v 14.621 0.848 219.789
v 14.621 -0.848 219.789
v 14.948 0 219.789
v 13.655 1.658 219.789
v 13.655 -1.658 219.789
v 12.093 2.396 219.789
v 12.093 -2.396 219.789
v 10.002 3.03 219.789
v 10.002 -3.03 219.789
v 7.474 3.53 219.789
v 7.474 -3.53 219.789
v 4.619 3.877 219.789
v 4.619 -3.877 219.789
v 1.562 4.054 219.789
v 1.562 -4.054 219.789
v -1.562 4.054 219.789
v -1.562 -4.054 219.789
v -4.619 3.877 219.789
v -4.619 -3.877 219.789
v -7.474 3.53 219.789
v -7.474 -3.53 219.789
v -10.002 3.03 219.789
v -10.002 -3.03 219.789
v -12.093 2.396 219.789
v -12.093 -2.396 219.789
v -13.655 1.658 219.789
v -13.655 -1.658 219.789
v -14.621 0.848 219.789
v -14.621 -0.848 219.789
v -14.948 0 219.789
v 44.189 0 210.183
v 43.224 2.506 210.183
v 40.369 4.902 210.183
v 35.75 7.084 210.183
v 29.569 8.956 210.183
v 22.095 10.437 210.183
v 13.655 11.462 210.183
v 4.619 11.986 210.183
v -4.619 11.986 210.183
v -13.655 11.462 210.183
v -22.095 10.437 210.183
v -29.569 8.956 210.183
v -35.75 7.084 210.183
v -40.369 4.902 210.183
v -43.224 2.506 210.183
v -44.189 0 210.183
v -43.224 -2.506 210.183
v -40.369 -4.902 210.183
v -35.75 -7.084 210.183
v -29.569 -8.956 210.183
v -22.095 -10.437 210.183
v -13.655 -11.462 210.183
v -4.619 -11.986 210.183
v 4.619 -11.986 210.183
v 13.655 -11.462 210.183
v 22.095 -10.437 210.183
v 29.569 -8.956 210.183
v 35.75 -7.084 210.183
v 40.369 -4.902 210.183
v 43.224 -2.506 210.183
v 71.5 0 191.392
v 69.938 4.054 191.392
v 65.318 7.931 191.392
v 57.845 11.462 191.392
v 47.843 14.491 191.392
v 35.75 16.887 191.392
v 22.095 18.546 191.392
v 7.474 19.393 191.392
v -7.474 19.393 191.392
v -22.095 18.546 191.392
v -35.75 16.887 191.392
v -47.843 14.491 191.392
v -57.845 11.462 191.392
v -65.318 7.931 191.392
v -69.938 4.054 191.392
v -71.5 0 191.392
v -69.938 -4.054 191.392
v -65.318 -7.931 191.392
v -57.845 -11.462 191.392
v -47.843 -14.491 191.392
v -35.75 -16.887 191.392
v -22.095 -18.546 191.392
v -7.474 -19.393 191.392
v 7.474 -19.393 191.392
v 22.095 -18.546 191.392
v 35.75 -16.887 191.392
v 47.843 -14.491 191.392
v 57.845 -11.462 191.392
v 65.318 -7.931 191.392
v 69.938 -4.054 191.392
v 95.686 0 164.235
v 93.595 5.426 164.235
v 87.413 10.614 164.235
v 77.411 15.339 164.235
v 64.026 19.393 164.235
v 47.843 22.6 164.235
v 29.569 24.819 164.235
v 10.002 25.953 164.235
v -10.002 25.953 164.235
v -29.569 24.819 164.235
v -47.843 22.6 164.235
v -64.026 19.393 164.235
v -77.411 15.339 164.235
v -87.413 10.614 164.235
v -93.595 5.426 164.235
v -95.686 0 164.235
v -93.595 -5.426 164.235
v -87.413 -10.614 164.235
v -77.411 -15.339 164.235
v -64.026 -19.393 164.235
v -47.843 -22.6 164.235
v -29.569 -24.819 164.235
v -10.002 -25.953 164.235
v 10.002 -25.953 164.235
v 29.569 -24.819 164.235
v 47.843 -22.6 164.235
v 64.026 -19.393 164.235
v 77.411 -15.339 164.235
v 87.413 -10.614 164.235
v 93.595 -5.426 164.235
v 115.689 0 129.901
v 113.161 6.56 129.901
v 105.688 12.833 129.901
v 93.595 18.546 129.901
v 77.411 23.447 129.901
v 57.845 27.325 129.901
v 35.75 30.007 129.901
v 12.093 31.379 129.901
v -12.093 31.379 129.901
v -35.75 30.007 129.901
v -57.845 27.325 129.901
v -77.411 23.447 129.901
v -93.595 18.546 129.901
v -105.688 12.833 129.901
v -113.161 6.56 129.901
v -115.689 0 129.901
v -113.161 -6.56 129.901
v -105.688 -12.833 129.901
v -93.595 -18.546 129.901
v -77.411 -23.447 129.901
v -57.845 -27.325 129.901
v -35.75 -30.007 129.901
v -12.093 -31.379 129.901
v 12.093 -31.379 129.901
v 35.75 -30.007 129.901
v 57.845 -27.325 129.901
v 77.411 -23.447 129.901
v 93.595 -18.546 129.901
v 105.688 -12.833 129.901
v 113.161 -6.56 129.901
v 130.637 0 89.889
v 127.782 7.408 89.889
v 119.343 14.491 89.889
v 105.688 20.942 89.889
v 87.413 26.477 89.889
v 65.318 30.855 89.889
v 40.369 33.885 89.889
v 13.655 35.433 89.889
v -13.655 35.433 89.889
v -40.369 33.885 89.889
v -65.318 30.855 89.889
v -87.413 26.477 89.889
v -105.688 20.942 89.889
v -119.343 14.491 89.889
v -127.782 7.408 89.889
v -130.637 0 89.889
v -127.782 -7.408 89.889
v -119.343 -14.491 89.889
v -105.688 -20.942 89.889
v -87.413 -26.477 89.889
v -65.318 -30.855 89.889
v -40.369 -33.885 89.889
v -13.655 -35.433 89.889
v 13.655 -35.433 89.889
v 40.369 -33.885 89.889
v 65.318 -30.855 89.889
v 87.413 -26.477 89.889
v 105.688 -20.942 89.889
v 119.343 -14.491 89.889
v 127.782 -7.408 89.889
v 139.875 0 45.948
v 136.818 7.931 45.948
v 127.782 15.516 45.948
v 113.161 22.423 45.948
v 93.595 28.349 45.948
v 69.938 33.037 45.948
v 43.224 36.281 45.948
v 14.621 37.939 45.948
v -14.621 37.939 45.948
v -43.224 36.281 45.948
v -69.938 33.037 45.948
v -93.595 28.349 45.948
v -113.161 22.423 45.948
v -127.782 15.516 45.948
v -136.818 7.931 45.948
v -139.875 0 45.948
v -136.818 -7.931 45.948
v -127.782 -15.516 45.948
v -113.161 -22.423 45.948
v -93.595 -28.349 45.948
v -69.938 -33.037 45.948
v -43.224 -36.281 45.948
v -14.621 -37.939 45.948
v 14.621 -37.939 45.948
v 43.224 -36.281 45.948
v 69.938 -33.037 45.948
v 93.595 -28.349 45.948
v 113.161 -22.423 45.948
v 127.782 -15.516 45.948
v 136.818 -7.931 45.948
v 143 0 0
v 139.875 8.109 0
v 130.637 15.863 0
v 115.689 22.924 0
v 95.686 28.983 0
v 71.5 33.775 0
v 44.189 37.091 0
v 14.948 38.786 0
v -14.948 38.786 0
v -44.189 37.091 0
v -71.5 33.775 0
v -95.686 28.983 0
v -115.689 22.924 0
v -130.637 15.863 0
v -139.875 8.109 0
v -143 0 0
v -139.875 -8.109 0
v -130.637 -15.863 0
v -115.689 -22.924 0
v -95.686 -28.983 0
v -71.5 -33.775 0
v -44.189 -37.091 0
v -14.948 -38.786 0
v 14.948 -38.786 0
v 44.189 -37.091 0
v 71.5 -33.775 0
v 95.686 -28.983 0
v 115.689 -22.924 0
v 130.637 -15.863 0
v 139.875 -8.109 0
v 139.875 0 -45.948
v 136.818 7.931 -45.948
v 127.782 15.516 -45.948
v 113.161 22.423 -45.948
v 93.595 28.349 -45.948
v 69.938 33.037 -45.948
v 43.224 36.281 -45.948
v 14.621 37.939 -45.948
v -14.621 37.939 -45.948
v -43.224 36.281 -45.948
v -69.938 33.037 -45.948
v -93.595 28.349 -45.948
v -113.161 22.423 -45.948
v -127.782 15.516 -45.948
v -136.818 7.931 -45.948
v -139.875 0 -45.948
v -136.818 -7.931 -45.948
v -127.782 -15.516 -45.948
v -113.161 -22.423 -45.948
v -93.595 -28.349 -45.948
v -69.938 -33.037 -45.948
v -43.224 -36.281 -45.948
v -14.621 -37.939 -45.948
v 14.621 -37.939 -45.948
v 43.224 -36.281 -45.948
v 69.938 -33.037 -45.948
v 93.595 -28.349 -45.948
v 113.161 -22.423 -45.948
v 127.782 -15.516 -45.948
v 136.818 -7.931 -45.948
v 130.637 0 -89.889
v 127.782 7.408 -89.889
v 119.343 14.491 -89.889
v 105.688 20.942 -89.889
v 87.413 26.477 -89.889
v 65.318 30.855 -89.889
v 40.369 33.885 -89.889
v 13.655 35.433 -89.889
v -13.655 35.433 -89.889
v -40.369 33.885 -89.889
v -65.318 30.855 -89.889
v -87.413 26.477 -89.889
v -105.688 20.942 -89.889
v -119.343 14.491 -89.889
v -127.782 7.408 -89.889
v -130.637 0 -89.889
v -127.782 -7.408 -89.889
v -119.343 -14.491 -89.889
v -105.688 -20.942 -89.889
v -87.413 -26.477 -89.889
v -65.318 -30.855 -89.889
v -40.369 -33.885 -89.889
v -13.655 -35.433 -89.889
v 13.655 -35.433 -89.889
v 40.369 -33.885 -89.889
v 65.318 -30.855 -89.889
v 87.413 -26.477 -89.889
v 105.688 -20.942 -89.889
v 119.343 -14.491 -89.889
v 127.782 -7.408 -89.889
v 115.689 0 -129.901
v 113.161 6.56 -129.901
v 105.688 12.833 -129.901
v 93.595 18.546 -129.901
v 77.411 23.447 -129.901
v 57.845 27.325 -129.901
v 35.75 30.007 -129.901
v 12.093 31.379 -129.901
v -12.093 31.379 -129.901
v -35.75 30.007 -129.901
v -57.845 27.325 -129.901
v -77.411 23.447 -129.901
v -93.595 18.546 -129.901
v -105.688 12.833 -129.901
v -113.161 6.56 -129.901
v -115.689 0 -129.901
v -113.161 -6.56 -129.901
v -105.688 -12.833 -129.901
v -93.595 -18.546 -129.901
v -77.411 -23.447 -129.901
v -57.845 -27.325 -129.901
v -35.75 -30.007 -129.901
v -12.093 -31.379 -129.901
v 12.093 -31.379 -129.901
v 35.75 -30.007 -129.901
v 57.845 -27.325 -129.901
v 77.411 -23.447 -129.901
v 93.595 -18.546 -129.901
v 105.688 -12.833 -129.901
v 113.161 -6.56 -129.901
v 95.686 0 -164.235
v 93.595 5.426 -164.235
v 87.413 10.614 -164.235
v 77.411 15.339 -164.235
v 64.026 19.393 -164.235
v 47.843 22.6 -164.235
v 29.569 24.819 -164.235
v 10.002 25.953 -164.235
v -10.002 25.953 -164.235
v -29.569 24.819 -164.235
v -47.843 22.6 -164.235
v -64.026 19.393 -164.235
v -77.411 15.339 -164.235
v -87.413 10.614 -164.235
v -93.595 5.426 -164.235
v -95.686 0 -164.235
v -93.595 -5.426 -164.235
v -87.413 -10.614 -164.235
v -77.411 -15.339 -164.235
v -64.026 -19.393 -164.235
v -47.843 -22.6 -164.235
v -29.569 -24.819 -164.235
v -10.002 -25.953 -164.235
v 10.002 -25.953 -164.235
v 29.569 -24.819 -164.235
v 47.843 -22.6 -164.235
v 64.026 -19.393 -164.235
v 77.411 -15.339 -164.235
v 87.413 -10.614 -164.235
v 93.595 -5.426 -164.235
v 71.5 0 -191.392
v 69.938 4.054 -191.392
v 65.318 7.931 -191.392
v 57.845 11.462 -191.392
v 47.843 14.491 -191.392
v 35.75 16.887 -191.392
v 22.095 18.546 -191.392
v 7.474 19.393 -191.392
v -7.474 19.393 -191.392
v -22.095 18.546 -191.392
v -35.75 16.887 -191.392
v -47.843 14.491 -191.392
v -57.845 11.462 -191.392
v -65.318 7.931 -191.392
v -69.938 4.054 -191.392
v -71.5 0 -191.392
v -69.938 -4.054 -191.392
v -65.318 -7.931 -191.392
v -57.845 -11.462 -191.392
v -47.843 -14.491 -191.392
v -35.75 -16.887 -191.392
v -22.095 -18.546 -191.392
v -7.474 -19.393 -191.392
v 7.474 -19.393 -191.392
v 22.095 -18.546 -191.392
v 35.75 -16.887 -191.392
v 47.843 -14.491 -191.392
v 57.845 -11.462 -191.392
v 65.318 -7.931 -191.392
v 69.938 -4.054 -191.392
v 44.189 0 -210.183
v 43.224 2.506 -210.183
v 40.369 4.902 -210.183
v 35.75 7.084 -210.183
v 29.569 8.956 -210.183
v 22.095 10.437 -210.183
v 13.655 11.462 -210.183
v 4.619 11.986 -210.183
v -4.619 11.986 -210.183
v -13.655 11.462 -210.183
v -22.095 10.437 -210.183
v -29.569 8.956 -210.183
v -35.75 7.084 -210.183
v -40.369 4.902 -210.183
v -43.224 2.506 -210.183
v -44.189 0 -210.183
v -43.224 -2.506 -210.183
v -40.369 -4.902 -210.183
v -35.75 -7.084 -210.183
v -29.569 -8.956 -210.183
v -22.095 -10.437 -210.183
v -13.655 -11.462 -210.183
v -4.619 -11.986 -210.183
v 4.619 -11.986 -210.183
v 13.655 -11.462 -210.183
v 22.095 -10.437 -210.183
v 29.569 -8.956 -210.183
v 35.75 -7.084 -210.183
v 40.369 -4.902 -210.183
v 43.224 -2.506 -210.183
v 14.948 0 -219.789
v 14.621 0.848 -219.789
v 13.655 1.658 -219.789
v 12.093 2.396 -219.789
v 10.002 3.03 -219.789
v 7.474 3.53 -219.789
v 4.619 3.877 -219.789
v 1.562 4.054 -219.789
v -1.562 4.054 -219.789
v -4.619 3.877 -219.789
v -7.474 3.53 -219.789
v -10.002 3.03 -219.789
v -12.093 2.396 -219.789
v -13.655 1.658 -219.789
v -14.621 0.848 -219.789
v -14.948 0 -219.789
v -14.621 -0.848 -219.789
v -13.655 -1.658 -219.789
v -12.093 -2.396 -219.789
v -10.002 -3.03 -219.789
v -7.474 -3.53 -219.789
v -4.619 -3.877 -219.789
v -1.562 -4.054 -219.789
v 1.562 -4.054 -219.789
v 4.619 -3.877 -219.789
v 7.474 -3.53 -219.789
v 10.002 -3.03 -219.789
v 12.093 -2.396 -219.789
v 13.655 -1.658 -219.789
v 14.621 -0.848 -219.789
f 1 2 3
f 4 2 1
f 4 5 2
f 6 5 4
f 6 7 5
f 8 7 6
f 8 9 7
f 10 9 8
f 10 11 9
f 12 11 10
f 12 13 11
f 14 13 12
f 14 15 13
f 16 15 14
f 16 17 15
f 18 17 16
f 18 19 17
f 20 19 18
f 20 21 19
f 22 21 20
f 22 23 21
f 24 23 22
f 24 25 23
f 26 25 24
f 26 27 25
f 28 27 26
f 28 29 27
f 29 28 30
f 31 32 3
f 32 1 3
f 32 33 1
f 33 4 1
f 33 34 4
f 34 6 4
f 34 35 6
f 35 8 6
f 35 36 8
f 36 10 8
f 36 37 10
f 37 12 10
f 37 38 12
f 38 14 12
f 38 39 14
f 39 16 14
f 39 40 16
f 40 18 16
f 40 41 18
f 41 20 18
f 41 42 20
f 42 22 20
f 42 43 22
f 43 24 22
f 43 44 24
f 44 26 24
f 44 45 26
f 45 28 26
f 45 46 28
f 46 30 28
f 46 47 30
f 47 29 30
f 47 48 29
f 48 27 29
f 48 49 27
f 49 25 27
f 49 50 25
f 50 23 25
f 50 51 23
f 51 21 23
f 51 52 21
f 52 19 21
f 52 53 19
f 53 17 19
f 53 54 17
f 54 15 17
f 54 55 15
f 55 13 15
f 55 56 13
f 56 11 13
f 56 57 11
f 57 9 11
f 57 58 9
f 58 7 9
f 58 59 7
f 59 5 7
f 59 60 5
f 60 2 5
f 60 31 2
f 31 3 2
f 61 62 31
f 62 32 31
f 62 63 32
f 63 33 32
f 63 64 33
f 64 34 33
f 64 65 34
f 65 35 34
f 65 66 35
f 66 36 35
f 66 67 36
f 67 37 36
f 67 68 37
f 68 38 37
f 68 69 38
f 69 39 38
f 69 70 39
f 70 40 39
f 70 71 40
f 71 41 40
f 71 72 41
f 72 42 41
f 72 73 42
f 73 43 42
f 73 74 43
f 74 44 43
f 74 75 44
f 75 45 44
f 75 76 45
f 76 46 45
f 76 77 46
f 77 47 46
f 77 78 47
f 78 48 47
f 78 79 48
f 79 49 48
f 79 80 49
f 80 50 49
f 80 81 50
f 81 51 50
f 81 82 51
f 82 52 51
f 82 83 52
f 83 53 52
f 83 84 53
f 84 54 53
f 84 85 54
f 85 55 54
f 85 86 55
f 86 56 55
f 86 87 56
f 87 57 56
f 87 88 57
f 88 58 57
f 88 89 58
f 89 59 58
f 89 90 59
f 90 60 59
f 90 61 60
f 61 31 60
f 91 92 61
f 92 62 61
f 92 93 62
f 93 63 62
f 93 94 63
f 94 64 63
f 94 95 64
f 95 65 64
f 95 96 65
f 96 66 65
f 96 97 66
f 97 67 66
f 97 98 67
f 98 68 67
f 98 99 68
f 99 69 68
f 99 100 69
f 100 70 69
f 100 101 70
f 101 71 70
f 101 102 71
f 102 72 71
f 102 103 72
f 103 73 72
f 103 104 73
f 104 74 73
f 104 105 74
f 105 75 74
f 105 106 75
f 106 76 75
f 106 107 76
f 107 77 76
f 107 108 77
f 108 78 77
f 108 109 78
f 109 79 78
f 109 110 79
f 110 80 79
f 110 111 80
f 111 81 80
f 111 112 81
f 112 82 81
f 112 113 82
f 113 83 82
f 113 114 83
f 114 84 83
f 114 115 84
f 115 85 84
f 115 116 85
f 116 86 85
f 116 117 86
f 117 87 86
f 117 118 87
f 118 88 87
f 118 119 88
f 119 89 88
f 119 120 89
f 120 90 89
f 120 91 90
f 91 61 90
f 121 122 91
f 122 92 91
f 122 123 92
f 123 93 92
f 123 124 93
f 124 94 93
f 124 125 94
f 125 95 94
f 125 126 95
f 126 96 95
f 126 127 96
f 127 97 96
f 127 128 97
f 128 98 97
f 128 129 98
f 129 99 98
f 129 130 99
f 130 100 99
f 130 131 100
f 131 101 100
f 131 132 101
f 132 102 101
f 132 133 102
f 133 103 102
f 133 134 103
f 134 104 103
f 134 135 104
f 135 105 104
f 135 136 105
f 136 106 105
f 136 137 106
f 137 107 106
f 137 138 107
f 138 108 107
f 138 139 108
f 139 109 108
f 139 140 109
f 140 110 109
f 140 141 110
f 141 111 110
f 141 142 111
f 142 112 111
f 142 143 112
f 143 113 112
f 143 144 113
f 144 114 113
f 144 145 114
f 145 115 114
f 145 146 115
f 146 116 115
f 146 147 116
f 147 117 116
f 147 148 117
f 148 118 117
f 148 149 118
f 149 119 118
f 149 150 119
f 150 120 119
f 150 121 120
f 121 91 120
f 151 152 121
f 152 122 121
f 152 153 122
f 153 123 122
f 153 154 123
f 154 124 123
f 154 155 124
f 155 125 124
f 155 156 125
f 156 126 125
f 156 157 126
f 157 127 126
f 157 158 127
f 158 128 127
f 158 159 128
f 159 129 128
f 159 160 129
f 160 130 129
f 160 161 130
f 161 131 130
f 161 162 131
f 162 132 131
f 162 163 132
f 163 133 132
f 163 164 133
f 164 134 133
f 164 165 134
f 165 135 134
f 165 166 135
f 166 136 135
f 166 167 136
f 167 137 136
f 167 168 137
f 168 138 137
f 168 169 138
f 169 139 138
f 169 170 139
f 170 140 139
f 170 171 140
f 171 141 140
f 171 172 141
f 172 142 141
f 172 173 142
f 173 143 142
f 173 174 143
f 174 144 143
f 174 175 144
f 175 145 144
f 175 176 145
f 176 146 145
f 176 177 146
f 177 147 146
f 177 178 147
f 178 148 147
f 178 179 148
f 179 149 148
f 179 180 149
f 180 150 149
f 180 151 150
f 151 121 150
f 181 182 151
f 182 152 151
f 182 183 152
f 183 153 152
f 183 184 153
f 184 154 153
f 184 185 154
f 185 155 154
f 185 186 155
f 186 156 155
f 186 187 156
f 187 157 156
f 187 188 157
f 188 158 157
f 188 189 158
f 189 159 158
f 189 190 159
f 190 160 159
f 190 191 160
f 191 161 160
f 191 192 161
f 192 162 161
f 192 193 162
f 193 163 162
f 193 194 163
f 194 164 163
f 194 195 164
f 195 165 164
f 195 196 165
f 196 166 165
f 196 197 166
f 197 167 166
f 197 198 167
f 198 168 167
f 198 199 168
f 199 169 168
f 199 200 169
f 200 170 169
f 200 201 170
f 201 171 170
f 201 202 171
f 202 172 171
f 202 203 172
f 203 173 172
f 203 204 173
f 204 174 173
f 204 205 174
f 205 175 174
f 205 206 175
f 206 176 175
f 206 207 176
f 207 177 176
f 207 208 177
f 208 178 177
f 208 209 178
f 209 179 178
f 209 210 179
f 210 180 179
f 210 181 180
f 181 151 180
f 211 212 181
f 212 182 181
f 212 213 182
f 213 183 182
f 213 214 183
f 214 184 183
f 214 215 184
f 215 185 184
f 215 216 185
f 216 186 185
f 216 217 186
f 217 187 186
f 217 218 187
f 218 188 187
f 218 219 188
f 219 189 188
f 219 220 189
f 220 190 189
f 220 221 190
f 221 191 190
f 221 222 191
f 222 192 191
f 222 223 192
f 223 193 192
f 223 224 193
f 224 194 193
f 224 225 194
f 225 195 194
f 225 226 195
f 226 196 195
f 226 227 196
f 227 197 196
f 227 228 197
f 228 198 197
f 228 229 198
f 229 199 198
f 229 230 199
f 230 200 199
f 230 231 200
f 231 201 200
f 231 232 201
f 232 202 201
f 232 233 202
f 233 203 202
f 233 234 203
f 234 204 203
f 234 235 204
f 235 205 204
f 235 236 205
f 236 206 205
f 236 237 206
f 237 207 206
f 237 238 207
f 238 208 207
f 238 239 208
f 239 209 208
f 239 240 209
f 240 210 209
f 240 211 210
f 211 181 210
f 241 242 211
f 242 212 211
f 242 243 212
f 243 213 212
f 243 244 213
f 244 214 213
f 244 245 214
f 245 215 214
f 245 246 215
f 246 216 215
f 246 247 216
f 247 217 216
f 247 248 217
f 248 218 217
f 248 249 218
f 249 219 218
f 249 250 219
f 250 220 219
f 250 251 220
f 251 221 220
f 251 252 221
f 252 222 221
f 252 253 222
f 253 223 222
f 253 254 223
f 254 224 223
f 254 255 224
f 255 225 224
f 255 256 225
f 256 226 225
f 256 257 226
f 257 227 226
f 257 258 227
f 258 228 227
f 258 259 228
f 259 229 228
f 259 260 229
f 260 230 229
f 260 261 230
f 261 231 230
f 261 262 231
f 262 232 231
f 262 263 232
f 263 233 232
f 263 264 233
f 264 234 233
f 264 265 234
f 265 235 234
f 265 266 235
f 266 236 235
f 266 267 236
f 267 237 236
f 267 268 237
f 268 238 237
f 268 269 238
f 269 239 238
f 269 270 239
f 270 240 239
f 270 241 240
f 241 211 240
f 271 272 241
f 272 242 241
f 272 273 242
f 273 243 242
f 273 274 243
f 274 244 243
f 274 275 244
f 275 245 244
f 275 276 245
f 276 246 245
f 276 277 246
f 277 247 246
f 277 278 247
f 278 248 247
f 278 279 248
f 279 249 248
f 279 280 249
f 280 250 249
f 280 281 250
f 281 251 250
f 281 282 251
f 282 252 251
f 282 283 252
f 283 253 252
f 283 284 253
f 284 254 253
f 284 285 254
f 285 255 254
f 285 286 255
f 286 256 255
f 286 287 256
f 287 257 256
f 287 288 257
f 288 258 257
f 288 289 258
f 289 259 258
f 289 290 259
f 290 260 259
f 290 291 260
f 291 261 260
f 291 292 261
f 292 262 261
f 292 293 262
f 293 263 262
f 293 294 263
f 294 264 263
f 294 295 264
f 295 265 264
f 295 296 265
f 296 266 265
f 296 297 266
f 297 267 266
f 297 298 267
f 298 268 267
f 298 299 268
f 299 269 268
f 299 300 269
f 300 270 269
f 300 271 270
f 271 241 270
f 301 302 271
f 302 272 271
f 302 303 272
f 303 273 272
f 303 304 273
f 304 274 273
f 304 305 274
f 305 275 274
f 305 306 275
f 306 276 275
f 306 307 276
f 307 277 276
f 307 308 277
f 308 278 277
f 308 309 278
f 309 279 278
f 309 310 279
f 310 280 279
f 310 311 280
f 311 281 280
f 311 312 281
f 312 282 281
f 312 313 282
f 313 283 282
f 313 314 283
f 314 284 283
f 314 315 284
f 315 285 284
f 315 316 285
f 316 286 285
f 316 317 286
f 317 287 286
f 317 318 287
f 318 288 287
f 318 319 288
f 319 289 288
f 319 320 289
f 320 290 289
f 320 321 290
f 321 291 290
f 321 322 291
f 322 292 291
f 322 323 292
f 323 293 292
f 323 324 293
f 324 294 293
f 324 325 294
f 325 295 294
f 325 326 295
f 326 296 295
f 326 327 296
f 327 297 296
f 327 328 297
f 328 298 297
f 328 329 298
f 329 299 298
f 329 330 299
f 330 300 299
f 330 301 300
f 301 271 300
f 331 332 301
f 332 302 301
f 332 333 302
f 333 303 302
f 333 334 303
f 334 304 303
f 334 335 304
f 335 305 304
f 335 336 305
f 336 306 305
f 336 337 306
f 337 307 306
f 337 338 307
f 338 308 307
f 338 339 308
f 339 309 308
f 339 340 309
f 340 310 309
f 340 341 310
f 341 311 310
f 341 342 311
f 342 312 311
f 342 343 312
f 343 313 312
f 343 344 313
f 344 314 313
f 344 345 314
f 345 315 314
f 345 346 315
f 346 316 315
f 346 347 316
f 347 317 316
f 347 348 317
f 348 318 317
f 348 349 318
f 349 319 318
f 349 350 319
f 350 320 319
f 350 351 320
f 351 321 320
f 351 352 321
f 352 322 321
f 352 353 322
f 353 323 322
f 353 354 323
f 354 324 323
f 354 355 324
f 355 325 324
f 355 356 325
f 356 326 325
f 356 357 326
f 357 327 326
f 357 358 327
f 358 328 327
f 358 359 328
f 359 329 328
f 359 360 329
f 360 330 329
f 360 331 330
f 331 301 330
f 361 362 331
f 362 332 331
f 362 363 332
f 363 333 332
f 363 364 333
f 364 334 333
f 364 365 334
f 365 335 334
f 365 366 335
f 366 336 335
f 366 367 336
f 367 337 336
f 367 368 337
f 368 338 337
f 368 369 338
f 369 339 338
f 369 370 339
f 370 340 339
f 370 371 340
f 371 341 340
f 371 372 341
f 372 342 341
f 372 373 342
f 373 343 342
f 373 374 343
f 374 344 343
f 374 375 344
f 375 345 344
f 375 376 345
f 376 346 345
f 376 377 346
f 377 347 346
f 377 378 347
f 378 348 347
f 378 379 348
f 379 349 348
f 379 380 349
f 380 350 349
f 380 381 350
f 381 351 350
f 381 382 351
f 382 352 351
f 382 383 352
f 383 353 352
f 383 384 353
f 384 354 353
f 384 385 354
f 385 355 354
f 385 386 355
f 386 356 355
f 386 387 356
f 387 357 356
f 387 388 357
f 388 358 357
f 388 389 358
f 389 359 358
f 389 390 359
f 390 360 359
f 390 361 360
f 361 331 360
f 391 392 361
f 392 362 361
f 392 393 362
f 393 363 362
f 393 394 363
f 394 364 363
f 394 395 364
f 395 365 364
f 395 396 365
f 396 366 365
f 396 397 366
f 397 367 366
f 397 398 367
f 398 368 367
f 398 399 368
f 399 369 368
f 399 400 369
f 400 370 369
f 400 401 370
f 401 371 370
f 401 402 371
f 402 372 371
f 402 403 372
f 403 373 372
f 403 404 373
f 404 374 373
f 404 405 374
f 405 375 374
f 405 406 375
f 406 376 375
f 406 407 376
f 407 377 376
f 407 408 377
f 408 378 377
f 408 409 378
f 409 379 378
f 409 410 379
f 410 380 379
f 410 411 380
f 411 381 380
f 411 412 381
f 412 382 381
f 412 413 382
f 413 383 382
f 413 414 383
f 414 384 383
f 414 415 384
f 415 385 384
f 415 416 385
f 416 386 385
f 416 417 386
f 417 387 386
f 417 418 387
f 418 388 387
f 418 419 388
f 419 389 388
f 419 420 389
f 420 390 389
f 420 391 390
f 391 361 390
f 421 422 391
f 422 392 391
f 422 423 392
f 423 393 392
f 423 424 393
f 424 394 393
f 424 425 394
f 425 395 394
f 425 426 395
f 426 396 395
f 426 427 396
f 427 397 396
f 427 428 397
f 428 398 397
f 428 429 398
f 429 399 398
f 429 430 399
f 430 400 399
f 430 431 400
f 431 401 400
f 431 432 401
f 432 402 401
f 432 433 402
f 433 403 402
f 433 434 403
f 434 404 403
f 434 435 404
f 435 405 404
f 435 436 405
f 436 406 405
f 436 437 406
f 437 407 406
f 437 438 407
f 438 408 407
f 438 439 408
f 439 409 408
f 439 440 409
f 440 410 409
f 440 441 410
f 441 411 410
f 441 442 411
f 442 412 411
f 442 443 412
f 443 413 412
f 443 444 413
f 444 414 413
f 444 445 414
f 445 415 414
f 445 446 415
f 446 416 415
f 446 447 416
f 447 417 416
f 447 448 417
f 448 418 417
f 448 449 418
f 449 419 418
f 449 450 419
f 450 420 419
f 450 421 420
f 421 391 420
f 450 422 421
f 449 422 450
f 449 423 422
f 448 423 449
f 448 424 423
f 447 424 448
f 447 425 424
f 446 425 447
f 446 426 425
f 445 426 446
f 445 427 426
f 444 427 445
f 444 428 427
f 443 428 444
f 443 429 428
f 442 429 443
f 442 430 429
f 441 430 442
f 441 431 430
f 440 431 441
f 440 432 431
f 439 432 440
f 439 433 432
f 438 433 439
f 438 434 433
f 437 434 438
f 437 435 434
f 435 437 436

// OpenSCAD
// Generated by SolidPython 1.0.1 on 2020-07-29 00:46:49


scale(v = [11, 3, 17]) {
	sphere(r = 13);
}
/***********************************************
*********      SolidPython code:      **********
************************************************
 
# import packages: SolidPython
from solid import *
from solid.utils import *
from itertools import chain, combinations, permutations


class Resize:

    def __init__(self, scad_file):
        self.scad_file = scad_file
        #self.scad_file = import_scad(scad_file)
        # cone/cylinder param:
        self.r1 = 0
        self.r2 = 0
        self.h = 0
        # rectangular prism param:
        self.w = 0
        self.l = 0
        # ellipse param:
        self.r = 0

    # import OpenScad code (file name corresponds to shape)


    # classify shape + parameters
    def assign(self, param1, param2, param3):
        if self.scad_file == 'cone.scad':
            self.r1 = param1
            self.r2 = param2
            self.h = param3
        elif self.scad_file == 'cylinder.scad':
            self.r1 = param1
            self.r2 = param2
            self.h = param3
        elif self.scad_file == 'rectangularPrism.scad':
            self.h = param1
            self.l = param2
            self.w = param3
        else:
            self.r = param1
            self.h = param2

    # resize parameters
    def iterate(self):
        x = range(3, 20, 2)
        i = 1
        if self.scad_file == 'cone.scad':
            tempList = list(permutations(x, 2))
            for temp in tempList:
                param1 = temp[0]
                param2 = temp[1]
                filepath = 'produced_scad_files/' + 'cone' + str(param1) + '_' + str(param2) + '_' + '.scad'
                scad_render_to_file(cylinder(h=param1, r1=param2, r2=0), filepath)

        elif self.scad_file == 'cylinder.scad':
            tempList = list(permutations(x, 3))
            for temp in tempList:
                param1 = temp[0]
                param2 = temp[1]
                filepath = 'produced_scad_files/' + 'cylinder' + str(param1) + '_' + str(param2) + '_' + '.scad'
                scad_render_to_file(cylinder(h=param1, r1=param2, r2=param2), filepath)

        elif self.scad_file == 'rectangularPrism.scad':
            tempList = list(permutations(x, 3))
            for temp in tempList:
                param1 = temp[0]
                param2 = temp[1]
                param3 = temp[2]
                filepath = 'produced_scad_files/' + 'rectangularPrism' + str(param1) + '_' + str(param2) + '_' + str(
                    param3) + '.scad'
                scad_render_to_file(cube(size=(param1, param2, param3)), filepath)

        elif self.scad_file == 'ellipse.scad':
            tempList = list(permutations(x, 4))
            for temp in tempList:
                param1 = temp[0]
                param2 = temp[1]
                param3 = temp[2]
                param4 = temp[3]
                filepath = 'produced_scad_files/' + 'ellipse' + str(param1) + '_' + str(param2) + '_' + str(param3) + '_' + str(param4) + '.scad'
                scad_render_to_file(scale([param1, param2, param3])(sphere(r=param4)), filepath)

    def render_to_scadfile(self):
        scad_render_to_file(scad, 'example.scad') 
 
************************************************/
